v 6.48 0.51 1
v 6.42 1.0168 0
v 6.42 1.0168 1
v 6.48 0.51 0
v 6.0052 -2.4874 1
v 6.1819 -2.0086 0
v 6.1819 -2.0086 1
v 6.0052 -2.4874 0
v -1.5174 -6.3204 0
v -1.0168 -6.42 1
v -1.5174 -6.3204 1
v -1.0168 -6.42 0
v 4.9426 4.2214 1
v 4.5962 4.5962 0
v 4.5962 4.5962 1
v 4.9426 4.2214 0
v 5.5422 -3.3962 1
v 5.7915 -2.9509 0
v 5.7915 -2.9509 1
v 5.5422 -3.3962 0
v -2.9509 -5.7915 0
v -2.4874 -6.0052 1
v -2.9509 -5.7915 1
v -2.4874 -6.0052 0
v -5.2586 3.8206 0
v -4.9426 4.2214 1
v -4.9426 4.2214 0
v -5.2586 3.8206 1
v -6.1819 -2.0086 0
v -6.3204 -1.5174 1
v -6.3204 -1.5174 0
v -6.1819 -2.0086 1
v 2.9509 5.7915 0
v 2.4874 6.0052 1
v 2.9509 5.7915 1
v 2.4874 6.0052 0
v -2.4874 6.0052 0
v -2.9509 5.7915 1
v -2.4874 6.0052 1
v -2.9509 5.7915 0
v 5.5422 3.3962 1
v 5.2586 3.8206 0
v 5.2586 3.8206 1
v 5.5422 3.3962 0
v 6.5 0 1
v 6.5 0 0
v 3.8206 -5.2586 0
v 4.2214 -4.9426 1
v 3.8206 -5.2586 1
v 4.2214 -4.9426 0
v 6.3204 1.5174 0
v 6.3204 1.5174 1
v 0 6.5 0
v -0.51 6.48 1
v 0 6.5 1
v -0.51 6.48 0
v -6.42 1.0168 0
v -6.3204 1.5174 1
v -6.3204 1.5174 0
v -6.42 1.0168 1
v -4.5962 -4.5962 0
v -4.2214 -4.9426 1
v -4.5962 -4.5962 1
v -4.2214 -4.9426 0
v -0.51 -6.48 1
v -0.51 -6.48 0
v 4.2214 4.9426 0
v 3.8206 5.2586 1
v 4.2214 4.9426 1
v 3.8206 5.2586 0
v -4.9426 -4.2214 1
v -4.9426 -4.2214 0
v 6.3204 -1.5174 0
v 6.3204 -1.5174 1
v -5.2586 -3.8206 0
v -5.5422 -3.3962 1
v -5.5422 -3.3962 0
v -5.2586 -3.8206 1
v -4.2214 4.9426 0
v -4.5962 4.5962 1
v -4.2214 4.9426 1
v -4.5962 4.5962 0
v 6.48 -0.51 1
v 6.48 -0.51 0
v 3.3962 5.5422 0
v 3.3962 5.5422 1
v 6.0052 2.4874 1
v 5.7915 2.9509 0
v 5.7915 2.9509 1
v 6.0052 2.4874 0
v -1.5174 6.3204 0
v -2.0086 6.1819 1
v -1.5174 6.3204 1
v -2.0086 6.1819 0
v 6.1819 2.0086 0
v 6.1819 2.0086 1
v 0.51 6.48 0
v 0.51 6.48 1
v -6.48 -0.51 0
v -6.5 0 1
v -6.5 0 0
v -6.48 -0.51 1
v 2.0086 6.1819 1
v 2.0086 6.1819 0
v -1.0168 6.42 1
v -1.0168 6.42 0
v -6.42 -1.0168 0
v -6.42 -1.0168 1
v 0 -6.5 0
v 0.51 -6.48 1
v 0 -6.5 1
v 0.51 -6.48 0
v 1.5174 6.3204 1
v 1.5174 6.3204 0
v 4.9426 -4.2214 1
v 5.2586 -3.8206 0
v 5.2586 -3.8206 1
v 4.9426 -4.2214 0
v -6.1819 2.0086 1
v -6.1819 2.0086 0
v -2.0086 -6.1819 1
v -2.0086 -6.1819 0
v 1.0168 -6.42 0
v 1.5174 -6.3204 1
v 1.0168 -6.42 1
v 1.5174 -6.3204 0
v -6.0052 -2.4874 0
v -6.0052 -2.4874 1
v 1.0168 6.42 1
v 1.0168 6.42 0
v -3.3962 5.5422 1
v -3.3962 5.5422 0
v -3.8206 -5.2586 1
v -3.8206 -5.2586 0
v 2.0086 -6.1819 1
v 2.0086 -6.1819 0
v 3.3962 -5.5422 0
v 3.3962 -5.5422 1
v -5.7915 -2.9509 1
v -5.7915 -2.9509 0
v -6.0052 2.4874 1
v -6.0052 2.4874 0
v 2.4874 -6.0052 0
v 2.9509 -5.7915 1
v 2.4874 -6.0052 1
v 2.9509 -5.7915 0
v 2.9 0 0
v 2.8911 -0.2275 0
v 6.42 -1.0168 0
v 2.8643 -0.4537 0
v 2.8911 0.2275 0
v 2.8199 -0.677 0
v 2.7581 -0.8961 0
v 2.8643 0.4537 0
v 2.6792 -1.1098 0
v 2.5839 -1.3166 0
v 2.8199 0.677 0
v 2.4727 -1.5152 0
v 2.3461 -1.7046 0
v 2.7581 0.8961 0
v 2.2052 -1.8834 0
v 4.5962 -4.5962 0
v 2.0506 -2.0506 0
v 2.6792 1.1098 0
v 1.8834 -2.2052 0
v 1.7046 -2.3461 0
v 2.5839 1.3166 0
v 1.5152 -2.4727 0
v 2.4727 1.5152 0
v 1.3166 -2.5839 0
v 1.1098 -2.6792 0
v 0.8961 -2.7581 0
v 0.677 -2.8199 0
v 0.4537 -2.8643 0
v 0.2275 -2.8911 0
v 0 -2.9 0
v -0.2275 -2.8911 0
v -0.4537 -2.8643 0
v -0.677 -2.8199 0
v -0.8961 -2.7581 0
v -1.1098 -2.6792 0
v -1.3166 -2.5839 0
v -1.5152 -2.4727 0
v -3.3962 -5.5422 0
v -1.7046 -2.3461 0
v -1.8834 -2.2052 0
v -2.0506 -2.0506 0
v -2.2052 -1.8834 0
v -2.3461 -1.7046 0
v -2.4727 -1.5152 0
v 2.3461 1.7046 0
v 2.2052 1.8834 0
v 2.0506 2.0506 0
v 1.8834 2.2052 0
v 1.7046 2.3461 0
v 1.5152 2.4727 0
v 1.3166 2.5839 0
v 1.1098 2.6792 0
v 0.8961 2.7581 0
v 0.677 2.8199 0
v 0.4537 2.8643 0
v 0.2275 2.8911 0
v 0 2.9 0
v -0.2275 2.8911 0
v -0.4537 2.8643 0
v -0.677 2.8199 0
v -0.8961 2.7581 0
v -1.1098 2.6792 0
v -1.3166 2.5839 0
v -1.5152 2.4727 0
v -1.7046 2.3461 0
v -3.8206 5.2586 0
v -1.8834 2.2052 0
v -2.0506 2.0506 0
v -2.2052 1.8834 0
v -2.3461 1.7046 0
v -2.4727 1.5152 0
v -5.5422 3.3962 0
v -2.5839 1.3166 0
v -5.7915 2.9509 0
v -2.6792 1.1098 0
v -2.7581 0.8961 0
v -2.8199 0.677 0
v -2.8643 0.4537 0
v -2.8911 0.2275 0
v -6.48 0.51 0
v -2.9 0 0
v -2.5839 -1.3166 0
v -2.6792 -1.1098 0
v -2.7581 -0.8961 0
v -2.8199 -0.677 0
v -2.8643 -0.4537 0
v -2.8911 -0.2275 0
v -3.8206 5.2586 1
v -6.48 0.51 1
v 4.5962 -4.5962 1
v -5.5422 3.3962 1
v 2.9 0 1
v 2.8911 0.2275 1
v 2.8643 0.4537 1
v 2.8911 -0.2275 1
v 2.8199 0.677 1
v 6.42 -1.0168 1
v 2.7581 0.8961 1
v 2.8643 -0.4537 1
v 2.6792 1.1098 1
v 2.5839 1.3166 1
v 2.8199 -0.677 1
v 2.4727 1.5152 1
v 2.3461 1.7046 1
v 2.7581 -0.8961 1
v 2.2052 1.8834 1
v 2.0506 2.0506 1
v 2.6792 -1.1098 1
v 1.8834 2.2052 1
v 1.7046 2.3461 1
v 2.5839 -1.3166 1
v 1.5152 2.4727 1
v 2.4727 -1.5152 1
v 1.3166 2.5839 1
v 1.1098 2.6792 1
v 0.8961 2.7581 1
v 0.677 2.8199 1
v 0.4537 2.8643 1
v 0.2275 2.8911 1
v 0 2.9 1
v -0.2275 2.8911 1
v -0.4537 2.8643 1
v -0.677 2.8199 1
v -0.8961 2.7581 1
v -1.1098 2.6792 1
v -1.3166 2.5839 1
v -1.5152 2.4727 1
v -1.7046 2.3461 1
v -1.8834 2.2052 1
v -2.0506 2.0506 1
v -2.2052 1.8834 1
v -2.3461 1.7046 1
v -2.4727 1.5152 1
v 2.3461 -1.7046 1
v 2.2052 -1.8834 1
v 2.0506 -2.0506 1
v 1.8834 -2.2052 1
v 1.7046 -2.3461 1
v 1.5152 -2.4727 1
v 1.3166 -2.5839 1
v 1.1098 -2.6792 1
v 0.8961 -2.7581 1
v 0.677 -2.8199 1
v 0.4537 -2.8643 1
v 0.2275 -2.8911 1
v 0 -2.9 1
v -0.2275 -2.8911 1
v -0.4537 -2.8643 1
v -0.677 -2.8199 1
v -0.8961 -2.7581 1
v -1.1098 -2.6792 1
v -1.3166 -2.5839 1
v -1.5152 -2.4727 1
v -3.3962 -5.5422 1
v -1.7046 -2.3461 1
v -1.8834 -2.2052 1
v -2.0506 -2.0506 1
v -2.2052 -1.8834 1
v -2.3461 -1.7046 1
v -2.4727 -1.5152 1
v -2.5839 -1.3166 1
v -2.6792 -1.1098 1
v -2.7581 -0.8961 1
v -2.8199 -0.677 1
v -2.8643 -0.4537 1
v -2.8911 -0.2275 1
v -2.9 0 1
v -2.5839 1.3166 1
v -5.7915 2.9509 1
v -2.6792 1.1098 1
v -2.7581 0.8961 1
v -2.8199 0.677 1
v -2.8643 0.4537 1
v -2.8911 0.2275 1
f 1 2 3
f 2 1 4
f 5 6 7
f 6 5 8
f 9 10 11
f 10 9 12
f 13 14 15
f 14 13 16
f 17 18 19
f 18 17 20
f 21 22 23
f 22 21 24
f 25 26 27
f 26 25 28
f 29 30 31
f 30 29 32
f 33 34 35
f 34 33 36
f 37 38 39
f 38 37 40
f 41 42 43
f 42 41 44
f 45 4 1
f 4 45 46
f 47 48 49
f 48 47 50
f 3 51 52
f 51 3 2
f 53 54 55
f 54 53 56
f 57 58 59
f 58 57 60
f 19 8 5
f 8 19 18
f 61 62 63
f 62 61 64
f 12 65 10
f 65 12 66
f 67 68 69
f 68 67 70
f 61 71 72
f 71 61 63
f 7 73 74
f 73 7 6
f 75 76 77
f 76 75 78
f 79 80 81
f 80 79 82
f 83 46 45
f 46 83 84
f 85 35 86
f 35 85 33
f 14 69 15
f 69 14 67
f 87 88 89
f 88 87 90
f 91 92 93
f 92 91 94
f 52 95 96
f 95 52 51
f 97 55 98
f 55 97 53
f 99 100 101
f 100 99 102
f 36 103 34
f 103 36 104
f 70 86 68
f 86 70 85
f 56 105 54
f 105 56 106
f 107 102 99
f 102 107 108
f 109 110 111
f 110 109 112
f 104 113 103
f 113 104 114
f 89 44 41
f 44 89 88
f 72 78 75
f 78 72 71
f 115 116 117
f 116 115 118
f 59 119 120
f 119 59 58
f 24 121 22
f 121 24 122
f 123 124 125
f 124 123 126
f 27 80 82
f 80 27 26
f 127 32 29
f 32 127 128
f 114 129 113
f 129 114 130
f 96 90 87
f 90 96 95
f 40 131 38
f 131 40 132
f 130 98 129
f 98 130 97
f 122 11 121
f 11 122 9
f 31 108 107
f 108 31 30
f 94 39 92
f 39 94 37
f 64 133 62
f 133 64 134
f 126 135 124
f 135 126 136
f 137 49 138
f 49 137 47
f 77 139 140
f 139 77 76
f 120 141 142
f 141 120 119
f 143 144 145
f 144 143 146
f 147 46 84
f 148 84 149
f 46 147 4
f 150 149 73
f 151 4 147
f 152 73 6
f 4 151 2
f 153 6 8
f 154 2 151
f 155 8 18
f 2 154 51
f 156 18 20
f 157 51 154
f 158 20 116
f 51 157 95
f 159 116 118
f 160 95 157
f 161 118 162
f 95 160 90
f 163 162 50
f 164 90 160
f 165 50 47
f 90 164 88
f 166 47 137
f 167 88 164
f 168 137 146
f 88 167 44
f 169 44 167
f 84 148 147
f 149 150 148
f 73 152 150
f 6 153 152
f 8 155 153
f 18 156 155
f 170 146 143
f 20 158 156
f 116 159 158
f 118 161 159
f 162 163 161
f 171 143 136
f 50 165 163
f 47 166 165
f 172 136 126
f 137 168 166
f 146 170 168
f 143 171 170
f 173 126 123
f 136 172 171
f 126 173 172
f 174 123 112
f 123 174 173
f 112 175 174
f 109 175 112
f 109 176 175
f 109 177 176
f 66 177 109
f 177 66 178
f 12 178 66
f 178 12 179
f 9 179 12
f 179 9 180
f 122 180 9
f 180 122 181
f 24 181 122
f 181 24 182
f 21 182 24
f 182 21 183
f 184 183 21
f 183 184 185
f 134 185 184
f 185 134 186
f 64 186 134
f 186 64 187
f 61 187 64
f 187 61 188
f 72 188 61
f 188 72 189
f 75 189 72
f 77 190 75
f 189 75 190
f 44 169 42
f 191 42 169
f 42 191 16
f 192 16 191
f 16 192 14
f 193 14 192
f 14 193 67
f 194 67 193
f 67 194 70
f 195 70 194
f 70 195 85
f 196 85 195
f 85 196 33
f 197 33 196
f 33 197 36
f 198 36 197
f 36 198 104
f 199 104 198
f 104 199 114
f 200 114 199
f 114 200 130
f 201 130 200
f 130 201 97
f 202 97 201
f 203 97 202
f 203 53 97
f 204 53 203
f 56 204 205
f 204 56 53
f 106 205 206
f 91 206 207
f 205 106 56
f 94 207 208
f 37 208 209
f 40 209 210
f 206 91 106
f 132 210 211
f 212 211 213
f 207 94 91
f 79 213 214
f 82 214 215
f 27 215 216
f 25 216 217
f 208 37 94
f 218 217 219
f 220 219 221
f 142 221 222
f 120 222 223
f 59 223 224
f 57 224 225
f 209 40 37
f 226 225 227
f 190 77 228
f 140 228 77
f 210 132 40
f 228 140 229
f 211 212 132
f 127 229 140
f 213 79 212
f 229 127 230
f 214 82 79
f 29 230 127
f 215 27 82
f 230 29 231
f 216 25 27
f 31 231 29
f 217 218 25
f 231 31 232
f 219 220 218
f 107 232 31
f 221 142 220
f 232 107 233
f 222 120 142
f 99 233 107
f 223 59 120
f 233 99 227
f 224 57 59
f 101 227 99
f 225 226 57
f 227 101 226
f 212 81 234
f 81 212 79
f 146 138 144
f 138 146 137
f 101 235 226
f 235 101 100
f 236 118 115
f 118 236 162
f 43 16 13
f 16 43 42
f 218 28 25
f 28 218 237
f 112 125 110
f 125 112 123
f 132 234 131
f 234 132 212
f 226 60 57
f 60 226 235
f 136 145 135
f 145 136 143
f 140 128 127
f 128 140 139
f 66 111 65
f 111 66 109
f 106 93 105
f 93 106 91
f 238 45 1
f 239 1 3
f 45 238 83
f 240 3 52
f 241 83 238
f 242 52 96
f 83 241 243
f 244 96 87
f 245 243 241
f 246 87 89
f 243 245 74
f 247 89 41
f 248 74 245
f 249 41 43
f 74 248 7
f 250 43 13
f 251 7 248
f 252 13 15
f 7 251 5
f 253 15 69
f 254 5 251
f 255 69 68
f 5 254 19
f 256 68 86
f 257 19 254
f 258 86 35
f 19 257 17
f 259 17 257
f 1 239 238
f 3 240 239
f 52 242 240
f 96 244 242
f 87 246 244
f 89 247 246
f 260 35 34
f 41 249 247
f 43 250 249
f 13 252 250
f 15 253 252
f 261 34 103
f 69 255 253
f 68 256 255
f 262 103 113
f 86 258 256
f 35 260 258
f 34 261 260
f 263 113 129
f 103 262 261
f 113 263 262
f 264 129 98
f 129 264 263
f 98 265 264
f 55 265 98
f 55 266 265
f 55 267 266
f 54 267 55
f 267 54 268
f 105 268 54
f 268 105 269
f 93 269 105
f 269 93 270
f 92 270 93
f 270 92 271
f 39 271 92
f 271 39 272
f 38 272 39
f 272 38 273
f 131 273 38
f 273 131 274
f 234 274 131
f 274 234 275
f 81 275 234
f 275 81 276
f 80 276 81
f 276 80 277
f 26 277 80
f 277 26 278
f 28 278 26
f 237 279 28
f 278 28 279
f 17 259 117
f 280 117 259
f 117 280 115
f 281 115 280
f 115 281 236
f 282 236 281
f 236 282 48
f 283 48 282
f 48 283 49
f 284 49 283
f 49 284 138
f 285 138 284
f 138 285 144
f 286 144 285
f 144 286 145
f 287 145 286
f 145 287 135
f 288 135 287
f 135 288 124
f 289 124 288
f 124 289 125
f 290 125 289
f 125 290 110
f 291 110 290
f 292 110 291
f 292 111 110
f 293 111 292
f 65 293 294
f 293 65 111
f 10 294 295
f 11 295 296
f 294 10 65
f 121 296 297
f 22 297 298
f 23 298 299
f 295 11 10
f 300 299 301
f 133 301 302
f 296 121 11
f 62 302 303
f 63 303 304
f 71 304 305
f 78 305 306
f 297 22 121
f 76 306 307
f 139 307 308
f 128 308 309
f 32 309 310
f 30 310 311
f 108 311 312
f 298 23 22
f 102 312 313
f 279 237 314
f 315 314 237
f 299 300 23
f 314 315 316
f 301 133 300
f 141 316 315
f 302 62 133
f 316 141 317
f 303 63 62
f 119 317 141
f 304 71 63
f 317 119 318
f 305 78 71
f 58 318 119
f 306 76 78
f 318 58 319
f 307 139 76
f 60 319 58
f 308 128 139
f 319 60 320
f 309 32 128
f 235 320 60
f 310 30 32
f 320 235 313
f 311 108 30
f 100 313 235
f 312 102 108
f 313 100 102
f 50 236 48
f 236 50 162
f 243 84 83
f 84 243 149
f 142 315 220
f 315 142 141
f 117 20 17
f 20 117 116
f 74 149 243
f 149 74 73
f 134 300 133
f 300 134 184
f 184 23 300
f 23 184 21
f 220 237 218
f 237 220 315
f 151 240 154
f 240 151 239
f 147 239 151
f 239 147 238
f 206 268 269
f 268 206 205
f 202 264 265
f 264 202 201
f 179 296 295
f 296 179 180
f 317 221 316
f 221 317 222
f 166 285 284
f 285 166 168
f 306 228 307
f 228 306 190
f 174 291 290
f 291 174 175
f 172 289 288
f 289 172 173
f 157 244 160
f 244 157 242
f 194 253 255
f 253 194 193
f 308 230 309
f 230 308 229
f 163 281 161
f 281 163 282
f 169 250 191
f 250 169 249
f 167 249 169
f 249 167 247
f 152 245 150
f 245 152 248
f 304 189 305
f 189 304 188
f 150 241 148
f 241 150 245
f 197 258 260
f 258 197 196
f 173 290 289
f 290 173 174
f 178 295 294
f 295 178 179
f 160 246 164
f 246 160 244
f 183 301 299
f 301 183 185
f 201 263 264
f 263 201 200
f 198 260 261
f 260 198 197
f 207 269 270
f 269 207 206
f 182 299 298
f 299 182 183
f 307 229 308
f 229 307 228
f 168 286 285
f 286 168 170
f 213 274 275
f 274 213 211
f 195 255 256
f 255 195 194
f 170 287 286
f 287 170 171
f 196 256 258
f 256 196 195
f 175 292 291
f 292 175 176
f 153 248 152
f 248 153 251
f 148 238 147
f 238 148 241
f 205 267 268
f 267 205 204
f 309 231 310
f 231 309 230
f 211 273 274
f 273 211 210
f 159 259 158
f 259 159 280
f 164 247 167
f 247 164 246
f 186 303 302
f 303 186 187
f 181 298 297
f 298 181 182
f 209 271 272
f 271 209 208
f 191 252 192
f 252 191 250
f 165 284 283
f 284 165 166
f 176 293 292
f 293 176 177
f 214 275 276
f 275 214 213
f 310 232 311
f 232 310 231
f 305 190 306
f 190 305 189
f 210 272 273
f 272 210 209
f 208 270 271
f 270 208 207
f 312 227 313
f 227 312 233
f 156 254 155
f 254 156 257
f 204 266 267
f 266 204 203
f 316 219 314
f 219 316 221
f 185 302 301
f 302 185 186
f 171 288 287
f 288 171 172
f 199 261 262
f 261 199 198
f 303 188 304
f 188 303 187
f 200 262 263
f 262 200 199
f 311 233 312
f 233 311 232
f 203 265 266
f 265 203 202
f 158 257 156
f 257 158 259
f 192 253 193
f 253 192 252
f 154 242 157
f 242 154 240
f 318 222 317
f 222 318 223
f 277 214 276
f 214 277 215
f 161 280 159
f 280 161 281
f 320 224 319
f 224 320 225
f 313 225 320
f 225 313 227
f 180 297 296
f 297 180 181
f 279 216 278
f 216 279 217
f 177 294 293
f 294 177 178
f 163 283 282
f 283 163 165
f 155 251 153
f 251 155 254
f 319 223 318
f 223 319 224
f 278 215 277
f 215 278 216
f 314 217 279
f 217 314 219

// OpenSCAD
/*
difference(){
import("Hex_Spring.stl");
translate([135,100,9])rotate([-90,0,0])#cylinder(d=5.8,h=130,$fn=80);
}
*/

difference(){
cylinder(d=13,h=1,$fn=80);
translate([0,0,-2])cylinder(d=5.8,h=11,$fn=80);
}
